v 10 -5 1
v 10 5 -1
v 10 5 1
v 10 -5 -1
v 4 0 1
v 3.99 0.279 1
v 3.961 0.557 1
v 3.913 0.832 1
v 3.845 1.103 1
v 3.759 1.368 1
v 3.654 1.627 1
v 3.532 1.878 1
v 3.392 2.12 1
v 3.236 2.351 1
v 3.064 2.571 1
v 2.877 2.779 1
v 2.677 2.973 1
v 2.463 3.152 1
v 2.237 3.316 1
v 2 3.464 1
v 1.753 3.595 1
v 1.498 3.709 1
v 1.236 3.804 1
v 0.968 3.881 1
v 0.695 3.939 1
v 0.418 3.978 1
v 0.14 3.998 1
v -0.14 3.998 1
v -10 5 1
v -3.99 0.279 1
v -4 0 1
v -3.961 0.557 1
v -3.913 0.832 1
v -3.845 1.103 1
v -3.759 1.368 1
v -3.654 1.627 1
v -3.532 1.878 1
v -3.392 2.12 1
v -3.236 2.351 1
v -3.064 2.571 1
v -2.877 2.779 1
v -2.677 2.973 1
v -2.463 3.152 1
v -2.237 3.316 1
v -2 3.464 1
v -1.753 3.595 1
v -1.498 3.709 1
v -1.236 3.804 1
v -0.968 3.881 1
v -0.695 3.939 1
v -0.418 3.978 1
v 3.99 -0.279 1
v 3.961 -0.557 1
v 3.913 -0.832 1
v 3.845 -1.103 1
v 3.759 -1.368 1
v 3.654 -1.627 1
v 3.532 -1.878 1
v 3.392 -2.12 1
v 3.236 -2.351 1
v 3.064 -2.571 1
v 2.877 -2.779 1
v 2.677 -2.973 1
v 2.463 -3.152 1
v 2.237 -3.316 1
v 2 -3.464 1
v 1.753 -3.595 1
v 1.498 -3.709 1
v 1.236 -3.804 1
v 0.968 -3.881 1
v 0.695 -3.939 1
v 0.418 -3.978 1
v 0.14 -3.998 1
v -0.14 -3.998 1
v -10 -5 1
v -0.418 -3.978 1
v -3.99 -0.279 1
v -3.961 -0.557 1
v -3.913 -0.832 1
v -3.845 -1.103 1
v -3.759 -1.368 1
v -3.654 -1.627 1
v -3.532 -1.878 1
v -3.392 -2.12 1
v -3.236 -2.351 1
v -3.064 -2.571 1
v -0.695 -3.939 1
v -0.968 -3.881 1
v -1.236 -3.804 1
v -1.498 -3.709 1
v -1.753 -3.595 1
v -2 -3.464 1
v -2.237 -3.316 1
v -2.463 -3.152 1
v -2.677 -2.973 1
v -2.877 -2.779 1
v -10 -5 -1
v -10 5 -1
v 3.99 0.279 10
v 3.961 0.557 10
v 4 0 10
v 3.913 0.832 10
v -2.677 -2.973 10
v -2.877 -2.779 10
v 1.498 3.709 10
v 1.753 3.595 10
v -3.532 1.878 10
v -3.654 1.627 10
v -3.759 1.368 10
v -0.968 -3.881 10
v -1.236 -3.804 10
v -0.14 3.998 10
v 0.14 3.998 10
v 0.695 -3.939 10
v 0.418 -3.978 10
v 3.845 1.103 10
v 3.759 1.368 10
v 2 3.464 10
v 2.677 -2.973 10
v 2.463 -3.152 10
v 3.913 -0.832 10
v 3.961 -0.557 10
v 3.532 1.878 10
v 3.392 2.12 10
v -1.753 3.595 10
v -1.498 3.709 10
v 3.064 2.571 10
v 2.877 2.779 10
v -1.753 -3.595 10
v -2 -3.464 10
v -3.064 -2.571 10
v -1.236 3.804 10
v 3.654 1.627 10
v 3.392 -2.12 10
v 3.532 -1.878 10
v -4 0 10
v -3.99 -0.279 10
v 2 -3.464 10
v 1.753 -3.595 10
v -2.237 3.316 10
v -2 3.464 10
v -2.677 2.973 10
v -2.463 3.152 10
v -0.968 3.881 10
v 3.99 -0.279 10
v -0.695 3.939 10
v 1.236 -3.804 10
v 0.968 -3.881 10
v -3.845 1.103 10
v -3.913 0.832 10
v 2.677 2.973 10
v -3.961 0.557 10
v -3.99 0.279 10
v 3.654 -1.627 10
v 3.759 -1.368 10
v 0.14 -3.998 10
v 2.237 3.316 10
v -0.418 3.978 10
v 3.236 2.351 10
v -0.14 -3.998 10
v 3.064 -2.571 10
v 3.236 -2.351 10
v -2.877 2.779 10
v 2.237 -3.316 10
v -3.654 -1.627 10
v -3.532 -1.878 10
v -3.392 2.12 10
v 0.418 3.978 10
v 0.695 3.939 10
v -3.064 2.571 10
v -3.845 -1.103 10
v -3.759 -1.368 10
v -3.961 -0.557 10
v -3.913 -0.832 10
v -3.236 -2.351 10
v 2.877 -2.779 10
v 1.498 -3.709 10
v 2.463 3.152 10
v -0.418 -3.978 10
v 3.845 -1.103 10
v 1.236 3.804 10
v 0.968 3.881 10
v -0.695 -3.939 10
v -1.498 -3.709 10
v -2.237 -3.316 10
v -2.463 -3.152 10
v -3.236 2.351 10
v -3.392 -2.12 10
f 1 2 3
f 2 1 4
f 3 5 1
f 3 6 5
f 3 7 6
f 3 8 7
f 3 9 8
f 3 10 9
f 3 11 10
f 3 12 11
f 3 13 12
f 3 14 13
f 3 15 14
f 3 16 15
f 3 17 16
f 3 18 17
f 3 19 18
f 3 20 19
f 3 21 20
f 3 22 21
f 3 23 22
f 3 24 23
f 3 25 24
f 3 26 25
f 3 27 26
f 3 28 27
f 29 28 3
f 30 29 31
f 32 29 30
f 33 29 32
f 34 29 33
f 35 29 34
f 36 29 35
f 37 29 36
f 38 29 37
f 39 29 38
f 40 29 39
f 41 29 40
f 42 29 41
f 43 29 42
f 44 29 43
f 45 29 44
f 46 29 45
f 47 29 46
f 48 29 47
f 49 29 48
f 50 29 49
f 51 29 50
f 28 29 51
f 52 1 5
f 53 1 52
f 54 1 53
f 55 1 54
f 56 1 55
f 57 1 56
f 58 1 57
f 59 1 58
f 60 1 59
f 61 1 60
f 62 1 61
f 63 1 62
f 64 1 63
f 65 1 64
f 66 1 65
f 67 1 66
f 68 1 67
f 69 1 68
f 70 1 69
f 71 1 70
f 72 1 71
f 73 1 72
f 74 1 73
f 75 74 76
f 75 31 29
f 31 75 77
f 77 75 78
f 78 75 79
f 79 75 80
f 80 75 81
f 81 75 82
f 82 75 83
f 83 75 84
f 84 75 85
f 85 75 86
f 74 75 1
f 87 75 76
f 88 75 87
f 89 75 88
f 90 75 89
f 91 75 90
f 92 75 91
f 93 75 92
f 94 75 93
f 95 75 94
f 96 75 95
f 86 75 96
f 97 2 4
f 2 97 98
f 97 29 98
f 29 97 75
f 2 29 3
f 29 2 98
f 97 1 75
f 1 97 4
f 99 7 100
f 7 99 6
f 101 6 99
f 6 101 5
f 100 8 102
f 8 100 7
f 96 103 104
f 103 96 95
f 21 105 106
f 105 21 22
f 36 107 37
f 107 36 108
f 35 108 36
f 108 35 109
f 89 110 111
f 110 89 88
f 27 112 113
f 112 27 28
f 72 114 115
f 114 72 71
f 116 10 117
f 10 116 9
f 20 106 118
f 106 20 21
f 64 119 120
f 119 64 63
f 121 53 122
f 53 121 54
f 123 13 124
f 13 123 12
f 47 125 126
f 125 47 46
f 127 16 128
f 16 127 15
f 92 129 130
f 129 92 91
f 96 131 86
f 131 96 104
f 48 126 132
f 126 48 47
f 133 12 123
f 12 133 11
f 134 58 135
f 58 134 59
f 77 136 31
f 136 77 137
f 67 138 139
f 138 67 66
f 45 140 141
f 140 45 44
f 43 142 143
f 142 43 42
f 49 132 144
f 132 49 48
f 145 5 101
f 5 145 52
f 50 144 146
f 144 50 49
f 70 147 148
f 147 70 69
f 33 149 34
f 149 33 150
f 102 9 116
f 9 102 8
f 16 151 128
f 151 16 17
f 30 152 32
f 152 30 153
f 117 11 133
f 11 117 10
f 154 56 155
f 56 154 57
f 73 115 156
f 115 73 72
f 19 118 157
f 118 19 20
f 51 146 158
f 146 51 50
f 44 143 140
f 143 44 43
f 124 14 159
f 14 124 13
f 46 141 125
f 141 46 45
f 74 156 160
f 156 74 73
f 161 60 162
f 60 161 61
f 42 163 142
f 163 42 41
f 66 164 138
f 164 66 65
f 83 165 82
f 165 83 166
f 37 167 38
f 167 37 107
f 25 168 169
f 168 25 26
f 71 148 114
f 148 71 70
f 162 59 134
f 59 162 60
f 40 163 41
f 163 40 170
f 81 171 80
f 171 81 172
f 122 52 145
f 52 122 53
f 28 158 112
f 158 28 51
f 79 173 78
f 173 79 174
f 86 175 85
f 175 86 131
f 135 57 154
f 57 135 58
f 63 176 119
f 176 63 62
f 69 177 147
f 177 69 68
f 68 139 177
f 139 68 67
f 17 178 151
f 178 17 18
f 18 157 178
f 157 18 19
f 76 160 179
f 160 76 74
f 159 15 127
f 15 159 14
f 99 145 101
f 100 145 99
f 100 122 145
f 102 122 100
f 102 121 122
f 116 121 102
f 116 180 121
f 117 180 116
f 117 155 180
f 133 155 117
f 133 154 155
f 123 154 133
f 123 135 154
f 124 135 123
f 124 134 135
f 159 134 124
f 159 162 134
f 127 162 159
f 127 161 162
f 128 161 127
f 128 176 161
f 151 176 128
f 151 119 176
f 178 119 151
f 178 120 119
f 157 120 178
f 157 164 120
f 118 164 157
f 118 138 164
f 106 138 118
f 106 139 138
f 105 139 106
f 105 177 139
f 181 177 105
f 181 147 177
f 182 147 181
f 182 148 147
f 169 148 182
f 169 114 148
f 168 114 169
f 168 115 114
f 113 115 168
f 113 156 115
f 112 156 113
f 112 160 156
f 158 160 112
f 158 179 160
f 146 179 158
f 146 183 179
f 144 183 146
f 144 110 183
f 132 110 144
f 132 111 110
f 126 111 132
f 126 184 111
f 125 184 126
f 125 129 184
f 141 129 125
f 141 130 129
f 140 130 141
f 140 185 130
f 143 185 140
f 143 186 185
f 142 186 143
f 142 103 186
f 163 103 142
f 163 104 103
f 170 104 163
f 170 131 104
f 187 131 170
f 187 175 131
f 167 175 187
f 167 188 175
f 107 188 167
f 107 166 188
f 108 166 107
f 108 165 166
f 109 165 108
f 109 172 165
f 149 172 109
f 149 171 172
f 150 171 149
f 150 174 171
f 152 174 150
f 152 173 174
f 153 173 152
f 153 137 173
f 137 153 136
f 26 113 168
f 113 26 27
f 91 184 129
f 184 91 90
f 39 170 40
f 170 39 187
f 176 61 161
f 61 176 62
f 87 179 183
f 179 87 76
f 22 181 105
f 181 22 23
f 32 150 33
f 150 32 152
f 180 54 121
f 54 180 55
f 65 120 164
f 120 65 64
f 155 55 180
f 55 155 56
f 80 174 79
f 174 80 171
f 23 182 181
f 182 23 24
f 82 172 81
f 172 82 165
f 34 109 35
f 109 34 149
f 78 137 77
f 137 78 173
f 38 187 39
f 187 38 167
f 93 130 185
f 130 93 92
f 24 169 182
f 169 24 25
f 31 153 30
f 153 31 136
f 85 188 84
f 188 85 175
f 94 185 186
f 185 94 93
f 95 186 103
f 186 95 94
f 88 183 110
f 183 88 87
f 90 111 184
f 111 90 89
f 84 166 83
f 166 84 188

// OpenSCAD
/*
 * Welcome to the Advent Calendar - Tutorial Edition - Part 04
 */

// In part 4, we can finally see how to create more complex things using
// the geomeric primitive. For that we don't just need to transform
// those primitives but also define how they interact with each other.
//
// For that we are going to use the three basic operations of Constructive
// Solid Geometry (CSG): Union, Difference and Intersection.

step = 1; // [1:4]

/*** STEP 1 ***/

// Union combine multiple geometric objects into a single one. In this
// case, we combine a rectangular plate with a cylinder.

if (step == 1) {

union() {
	cube([20, 10, 2], center = true);
	cylinder(r = 4, h = 10);
}

}

// Both primitives sit on the X/Y plane, the union() combines the,
// removing the overlapping geometry of the cylinder inside the cuboid.

/*** STEP 2 ***/

// The next operation is difference() which uses it's first geometry as
// basis and removes all following objects from it.

if (step == 2) {

difference() {
	union() {
		cube([20, 10, 2], center = true);
		cylinder(r = 4, h = 10);
	}
	
	translate([ 0, 0, -2]) cylinder(r = 3, h = 14);
	translate([-8, 0, -2]) cylinder(r = 1, h = 4);
	translate([ 8, 0, -2]) cylinder(r = 1, h = 4);
}

}

/*** STEP 3 ***/

// The third operation is intersection() which retains only the
// overlapping geometry. In the example, we keep the overlapping parts
// of a cube and a sphere. This creates a dice like shape with flat
// sides from the cube and rounded corners from the sphere.

if (step == 3) {

intersection() {
	cube(14, center = true);
	sphere(10);
}

}

/*** STEP 4 ***/

// Combining all this, we can create the visualization that is shown on
// the CSG Wikipedia page.
// https://en.wikipedia.org/wiki/Constructive_solid_geometry

// A more detailed model of that can be found via the menu entry
// File -> Examples -> Basics -> CSG-modules.scad

if (step == 4) {

translate([0, 0, 20]) {
	difference() {
		intersection() {
			cube(12, center = true);
			sphere(8);
		}
		cylinder(h=20, r=4, center=true);
		rotate([90, 0, 0]) cylinder(h=20, r=4, center=true);
		rotate([0, 90, 0]) cylinder(h=20, r=4, center=true);
	}
}

translate([-20, 0, 0]) {
	intersection() {
		cube(6, center = true);
		sphere(4);
	}
}

translate([-30, 0, -20]) {
	cube(6, center = true);
}

translate([-18, 0, -20]) {
	sphere(4);
}

translate([16, 0, 0]) {
	union() {
		cylinder(h=10, r=2, center=true);
		rotate([90, 0, 0]) cylinder(h=10, r=2, center=true);
		rotate([0, 90, 0]) cylinder(h=10, r=2, center=true);
	}
}

translate([2, 0, -20]) cylinder(h=10, r=2, center=true);
translate([12, 0, -20]) rotate([0, 90, 0]) cylinder(h=10, r=2, center=true);
translate([22, 0, -20]) rotate([90, 0, 0]) cylinder(h=10, r=2, center=true);

}

/*** THE END ***/

/*********************************************************************/

// Written in 2024 by Torsten Paul <Torsten.Paul@gmx.de>
//
// To the extent possible under law, the author(s) have dedicated all
// copyright and related and neighboring rights to this software to the
// public domain worldwide. This software is distributed without any
// warranty.
//
// You should have received a copy of the CC0 Public Domain
// Dedication along with this software.
// If not, see <http://creativecommons.org/publicdomain/zero/1.0/>.

$fa = 4; $fs = 0.2;
